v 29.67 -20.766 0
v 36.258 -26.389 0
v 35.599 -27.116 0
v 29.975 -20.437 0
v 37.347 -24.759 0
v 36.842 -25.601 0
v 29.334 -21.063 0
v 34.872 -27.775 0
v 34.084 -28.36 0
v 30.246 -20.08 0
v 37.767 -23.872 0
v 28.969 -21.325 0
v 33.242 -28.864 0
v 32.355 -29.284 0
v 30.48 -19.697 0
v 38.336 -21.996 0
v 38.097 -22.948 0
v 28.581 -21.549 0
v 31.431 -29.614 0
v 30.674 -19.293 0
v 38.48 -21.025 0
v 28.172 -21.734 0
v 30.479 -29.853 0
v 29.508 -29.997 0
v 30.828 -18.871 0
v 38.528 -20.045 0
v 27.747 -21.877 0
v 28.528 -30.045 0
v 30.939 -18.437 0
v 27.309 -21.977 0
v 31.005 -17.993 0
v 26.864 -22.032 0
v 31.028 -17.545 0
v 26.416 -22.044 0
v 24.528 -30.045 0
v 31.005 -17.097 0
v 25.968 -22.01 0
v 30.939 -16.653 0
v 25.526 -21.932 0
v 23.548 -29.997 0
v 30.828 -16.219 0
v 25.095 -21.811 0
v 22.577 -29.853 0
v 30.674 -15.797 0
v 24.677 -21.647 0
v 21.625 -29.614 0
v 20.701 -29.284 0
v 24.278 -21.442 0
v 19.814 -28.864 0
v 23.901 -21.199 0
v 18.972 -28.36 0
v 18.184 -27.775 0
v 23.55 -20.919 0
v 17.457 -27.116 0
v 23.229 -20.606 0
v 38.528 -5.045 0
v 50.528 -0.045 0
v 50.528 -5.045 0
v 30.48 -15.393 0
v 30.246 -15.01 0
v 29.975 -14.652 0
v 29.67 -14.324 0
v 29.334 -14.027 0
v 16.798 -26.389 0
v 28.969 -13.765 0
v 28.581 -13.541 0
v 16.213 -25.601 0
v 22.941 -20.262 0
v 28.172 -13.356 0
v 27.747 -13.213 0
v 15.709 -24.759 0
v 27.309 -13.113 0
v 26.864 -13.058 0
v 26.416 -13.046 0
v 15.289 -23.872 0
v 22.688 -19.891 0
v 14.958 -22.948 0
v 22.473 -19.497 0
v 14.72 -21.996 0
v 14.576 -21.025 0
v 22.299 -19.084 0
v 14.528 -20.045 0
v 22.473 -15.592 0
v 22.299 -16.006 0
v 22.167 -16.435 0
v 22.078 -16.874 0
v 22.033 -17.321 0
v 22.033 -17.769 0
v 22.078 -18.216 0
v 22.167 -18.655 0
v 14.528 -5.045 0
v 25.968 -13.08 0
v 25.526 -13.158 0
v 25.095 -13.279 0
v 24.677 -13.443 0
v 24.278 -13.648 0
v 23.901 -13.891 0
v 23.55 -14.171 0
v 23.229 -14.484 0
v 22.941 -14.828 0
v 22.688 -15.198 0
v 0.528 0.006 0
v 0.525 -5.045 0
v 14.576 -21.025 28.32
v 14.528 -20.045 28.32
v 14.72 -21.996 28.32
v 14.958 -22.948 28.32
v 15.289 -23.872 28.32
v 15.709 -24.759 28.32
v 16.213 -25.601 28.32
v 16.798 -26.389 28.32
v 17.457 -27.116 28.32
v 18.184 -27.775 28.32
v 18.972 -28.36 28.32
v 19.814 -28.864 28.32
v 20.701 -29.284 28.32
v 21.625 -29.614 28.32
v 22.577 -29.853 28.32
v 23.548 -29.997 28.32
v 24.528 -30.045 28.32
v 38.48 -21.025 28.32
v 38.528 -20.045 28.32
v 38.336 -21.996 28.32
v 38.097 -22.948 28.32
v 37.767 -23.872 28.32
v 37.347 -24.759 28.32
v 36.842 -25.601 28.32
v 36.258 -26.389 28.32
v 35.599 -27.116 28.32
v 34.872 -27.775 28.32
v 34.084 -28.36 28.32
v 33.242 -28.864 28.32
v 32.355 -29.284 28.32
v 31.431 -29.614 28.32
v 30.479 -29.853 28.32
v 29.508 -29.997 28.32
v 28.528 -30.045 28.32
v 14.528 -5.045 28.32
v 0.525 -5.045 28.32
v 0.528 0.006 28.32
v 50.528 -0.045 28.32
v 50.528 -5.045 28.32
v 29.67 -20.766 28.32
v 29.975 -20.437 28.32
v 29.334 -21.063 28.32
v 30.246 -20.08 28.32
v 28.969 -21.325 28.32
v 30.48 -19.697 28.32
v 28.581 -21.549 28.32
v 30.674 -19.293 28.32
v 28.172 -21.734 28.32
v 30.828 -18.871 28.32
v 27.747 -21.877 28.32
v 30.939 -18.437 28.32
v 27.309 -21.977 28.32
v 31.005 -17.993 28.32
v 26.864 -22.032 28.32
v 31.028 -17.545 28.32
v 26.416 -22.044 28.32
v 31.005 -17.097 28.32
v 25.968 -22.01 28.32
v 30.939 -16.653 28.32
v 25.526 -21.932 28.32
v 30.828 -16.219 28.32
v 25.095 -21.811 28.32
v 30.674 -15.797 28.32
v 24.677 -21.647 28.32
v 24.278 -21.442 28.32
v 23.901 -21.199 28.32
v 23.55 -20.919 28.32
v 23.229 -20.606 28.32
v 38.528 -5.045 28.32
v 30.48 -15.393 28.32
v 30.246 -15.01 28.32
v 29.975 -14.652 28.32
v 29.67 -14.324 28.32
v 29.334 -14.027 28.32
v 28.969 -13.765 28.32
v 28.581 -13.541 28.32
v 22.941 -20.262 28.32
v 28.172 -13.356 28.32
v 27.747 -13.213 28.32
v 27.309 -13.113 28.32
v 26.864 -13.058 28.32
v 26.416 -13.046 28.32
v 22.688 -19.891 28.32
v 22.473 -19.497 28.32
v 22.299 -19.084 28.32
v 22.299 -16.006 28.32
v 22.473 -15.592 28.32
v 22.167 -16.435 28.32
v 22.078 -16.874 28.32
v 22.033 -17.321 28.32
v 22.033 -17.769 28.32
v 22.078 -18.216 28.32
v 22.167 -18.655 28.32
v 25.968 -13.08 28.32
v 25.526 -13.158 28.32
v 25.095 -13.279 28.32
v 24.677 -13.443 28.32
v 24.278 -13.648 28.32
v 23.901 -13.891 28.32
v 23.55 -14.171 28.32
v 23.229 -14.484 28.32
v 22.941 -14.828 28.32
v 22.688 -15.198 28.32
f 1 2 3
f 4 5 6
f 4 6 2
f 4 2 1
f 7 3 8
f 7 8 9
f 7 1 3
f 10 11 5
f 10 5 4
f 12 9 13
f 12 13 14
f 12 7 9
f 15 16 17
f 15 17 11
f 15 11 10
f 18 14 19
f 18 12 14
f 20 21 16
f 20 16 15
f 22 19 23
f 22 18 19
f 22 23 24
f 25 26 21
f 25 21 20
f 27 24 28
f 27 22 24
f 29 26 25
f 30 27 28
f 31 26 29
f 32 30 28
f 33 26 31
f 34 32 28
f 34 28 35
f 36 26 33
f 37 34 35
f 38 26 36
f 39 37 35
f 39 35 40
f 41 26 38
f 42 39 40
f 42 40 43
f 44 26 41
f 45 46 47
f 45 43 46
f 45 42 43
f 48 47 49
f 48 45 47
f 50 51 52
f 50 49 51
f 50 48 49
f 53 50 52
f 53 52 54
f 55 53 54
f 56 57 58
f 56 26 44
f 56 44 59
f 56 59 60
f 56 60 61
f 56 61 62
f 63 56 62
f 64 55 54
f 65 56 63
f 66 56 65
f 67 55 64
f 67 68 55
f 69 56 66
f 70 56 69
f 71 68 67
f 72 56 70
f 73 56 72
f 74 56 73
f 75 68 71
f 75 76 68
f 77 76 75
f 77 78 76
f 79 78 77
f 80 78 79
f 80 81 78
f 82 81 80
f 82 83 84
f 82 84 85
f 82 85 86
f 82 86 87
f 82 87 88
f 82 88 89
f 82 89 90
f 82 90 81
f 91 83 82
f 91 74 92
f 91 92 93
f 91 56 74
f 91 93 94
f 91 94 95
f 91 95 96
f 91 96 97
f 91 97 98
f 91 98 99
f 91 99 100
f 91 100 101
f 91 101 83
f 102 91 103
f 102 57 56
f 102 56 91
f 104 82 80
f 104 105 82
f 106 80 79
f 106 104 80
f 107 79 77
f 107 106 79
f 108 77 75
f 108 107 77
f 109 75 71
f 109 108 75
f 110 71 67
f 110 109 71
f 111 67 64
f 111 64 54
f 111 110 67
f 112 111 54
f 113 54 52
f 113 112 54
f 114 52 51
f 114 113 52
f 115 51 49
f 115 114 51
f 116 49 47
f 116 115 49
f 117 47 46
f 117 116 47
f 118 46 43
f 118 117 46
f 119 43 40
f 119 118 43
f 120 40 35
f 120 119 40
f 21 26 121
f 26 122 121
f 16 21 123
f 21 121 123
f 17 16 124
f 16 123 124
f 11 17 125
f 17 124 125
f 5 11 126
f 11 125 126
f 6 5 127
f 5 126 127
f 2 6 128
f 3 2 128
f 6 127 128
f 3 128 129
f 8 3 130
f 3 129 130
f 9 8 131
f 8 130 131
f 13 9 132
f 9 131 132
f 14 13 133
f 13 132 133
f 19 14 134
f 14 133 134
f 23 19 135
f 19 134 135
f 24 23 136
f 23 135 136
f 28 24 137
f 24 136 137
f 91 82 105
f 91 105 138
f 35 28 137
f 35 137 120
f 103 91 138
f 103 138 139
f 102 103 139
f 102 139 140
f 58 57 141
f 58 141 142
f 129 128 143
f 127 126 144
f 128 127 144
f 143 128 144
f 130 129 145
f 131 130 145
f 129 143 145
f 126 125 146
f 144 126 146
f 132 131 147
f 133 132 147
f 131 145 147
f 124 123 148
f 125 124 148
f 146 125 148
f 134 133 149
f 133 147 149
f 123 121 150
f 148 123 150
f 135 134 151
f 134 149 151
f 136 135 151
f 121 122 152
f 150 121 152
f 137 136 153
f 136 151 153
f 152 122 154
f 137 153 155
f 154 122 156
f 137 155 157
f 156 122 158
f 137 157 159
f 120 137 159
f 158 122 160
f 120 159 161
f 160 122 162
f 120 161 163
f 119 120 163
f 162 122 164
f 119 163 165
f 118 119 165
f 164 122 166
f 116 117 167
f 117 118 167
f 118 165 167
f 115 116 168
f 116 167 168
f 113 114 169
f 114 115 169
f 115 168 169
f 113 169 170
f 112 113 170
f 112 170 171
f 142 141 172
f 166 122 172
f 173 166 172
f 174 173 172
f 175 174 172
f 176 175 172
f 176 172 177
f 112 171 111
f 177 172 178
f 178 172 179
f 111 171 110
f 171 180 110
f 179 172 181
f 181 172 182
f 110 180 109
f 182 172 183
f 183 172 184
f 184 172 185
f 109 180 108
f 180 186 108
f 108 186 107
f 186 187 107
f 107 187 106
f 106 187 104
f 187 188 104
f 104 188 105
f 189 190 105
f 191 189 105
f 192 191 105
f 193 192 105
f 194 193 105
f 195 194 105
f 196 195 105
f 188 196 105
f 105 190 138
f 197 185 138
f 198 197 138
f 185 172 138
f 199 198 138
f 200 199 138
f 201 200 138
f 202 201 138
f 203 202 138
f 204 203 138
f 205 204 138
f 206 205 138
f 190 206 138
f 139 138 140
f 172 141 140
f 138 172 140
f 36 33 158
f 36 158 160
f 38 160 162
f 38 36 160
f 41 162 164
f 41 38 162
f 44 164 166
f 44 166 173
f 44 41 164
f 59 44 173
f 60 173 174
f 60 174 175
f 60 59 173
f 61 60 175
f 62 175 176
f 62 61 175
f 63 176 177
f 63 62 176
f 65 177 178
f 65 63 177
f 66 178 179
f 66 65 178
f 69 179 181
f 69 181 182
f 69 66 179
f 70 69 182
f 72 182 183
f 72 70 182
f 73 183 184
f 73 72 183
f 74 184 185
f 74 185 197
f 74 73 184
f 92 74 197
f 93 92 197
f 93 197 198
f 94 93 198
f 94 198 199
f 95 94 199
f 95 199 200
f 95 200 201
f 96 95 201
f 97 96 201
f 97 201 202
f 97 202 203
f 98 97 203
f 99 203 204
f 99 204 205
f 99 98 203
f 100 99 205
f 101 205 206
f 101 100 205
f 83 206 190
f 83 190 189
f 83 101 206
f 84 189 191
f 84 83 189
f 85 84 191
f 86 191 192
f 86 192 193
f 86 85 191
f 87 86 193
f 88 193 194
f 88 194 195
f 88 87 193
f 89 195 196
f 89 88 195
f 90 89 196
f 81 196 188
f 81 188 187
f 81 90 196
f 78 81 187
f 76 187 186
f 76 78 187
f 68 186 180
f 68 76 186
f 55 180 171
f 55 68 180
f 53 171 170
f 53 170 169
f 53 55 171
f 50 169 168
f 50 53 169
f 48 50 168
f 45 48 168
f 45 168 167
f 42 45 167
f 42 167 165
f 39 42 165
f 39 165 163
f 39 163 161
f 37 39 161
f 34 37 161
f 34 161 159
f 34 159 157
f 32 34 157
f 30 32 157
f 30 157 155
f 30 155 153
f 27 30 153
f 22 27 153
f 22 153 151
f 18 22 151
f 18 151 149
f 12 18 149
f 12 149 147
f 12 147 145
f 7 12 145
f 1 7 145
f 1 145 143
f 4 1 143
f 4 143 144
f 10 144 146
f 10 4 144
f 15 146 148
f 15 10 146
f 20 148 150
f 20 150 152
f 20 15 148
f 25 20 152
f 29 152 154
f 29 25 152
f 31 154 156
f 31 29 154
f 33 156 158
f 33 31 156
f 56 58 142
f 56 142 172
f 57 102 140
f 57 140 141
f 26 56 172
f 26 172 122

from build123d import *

# Parameters (mm, degrees)
CROQUIS1_R              = 4.5
SALIENTE_EXTRUIR1_DEPTH = 28.32
REDONDEO1_R             = 10


with BuildPart() as part:
    # Croquis1 → Saliente-Extruir1 (new body)
    with BuildSketch(Plane.XY):
        Polygon((0.527798388, 0.005572044), (50.52777288, -0.044933007), (50.527798388, -5.044933007), (38.527798388, -5.044933007), (38.527798388, -30.044933007), (14.527798388, -30.044933007), (14.527798388, -5.044933007), (0.524677348, -5.044933007), align=None)
        with Locations((26.527798388, -17.544933007)):
            Circle(CROQUIS1_R, mode=Mode.SUBTRACT)
    extrude(amount=SALIENTE_EXTRUIR1_DEPTH)

    # Redondeo1
    redondeo1_edges = [part.edges().sort_by_distance(p)[0] for p in [
        (38.527798388, -30.044933007, 14.16),
        (14.527798388, -30.044933007, 14.16),
    ]]
    fillet(redondeo1_edges, radius=REDONDEO1_R)


solid = part.part
